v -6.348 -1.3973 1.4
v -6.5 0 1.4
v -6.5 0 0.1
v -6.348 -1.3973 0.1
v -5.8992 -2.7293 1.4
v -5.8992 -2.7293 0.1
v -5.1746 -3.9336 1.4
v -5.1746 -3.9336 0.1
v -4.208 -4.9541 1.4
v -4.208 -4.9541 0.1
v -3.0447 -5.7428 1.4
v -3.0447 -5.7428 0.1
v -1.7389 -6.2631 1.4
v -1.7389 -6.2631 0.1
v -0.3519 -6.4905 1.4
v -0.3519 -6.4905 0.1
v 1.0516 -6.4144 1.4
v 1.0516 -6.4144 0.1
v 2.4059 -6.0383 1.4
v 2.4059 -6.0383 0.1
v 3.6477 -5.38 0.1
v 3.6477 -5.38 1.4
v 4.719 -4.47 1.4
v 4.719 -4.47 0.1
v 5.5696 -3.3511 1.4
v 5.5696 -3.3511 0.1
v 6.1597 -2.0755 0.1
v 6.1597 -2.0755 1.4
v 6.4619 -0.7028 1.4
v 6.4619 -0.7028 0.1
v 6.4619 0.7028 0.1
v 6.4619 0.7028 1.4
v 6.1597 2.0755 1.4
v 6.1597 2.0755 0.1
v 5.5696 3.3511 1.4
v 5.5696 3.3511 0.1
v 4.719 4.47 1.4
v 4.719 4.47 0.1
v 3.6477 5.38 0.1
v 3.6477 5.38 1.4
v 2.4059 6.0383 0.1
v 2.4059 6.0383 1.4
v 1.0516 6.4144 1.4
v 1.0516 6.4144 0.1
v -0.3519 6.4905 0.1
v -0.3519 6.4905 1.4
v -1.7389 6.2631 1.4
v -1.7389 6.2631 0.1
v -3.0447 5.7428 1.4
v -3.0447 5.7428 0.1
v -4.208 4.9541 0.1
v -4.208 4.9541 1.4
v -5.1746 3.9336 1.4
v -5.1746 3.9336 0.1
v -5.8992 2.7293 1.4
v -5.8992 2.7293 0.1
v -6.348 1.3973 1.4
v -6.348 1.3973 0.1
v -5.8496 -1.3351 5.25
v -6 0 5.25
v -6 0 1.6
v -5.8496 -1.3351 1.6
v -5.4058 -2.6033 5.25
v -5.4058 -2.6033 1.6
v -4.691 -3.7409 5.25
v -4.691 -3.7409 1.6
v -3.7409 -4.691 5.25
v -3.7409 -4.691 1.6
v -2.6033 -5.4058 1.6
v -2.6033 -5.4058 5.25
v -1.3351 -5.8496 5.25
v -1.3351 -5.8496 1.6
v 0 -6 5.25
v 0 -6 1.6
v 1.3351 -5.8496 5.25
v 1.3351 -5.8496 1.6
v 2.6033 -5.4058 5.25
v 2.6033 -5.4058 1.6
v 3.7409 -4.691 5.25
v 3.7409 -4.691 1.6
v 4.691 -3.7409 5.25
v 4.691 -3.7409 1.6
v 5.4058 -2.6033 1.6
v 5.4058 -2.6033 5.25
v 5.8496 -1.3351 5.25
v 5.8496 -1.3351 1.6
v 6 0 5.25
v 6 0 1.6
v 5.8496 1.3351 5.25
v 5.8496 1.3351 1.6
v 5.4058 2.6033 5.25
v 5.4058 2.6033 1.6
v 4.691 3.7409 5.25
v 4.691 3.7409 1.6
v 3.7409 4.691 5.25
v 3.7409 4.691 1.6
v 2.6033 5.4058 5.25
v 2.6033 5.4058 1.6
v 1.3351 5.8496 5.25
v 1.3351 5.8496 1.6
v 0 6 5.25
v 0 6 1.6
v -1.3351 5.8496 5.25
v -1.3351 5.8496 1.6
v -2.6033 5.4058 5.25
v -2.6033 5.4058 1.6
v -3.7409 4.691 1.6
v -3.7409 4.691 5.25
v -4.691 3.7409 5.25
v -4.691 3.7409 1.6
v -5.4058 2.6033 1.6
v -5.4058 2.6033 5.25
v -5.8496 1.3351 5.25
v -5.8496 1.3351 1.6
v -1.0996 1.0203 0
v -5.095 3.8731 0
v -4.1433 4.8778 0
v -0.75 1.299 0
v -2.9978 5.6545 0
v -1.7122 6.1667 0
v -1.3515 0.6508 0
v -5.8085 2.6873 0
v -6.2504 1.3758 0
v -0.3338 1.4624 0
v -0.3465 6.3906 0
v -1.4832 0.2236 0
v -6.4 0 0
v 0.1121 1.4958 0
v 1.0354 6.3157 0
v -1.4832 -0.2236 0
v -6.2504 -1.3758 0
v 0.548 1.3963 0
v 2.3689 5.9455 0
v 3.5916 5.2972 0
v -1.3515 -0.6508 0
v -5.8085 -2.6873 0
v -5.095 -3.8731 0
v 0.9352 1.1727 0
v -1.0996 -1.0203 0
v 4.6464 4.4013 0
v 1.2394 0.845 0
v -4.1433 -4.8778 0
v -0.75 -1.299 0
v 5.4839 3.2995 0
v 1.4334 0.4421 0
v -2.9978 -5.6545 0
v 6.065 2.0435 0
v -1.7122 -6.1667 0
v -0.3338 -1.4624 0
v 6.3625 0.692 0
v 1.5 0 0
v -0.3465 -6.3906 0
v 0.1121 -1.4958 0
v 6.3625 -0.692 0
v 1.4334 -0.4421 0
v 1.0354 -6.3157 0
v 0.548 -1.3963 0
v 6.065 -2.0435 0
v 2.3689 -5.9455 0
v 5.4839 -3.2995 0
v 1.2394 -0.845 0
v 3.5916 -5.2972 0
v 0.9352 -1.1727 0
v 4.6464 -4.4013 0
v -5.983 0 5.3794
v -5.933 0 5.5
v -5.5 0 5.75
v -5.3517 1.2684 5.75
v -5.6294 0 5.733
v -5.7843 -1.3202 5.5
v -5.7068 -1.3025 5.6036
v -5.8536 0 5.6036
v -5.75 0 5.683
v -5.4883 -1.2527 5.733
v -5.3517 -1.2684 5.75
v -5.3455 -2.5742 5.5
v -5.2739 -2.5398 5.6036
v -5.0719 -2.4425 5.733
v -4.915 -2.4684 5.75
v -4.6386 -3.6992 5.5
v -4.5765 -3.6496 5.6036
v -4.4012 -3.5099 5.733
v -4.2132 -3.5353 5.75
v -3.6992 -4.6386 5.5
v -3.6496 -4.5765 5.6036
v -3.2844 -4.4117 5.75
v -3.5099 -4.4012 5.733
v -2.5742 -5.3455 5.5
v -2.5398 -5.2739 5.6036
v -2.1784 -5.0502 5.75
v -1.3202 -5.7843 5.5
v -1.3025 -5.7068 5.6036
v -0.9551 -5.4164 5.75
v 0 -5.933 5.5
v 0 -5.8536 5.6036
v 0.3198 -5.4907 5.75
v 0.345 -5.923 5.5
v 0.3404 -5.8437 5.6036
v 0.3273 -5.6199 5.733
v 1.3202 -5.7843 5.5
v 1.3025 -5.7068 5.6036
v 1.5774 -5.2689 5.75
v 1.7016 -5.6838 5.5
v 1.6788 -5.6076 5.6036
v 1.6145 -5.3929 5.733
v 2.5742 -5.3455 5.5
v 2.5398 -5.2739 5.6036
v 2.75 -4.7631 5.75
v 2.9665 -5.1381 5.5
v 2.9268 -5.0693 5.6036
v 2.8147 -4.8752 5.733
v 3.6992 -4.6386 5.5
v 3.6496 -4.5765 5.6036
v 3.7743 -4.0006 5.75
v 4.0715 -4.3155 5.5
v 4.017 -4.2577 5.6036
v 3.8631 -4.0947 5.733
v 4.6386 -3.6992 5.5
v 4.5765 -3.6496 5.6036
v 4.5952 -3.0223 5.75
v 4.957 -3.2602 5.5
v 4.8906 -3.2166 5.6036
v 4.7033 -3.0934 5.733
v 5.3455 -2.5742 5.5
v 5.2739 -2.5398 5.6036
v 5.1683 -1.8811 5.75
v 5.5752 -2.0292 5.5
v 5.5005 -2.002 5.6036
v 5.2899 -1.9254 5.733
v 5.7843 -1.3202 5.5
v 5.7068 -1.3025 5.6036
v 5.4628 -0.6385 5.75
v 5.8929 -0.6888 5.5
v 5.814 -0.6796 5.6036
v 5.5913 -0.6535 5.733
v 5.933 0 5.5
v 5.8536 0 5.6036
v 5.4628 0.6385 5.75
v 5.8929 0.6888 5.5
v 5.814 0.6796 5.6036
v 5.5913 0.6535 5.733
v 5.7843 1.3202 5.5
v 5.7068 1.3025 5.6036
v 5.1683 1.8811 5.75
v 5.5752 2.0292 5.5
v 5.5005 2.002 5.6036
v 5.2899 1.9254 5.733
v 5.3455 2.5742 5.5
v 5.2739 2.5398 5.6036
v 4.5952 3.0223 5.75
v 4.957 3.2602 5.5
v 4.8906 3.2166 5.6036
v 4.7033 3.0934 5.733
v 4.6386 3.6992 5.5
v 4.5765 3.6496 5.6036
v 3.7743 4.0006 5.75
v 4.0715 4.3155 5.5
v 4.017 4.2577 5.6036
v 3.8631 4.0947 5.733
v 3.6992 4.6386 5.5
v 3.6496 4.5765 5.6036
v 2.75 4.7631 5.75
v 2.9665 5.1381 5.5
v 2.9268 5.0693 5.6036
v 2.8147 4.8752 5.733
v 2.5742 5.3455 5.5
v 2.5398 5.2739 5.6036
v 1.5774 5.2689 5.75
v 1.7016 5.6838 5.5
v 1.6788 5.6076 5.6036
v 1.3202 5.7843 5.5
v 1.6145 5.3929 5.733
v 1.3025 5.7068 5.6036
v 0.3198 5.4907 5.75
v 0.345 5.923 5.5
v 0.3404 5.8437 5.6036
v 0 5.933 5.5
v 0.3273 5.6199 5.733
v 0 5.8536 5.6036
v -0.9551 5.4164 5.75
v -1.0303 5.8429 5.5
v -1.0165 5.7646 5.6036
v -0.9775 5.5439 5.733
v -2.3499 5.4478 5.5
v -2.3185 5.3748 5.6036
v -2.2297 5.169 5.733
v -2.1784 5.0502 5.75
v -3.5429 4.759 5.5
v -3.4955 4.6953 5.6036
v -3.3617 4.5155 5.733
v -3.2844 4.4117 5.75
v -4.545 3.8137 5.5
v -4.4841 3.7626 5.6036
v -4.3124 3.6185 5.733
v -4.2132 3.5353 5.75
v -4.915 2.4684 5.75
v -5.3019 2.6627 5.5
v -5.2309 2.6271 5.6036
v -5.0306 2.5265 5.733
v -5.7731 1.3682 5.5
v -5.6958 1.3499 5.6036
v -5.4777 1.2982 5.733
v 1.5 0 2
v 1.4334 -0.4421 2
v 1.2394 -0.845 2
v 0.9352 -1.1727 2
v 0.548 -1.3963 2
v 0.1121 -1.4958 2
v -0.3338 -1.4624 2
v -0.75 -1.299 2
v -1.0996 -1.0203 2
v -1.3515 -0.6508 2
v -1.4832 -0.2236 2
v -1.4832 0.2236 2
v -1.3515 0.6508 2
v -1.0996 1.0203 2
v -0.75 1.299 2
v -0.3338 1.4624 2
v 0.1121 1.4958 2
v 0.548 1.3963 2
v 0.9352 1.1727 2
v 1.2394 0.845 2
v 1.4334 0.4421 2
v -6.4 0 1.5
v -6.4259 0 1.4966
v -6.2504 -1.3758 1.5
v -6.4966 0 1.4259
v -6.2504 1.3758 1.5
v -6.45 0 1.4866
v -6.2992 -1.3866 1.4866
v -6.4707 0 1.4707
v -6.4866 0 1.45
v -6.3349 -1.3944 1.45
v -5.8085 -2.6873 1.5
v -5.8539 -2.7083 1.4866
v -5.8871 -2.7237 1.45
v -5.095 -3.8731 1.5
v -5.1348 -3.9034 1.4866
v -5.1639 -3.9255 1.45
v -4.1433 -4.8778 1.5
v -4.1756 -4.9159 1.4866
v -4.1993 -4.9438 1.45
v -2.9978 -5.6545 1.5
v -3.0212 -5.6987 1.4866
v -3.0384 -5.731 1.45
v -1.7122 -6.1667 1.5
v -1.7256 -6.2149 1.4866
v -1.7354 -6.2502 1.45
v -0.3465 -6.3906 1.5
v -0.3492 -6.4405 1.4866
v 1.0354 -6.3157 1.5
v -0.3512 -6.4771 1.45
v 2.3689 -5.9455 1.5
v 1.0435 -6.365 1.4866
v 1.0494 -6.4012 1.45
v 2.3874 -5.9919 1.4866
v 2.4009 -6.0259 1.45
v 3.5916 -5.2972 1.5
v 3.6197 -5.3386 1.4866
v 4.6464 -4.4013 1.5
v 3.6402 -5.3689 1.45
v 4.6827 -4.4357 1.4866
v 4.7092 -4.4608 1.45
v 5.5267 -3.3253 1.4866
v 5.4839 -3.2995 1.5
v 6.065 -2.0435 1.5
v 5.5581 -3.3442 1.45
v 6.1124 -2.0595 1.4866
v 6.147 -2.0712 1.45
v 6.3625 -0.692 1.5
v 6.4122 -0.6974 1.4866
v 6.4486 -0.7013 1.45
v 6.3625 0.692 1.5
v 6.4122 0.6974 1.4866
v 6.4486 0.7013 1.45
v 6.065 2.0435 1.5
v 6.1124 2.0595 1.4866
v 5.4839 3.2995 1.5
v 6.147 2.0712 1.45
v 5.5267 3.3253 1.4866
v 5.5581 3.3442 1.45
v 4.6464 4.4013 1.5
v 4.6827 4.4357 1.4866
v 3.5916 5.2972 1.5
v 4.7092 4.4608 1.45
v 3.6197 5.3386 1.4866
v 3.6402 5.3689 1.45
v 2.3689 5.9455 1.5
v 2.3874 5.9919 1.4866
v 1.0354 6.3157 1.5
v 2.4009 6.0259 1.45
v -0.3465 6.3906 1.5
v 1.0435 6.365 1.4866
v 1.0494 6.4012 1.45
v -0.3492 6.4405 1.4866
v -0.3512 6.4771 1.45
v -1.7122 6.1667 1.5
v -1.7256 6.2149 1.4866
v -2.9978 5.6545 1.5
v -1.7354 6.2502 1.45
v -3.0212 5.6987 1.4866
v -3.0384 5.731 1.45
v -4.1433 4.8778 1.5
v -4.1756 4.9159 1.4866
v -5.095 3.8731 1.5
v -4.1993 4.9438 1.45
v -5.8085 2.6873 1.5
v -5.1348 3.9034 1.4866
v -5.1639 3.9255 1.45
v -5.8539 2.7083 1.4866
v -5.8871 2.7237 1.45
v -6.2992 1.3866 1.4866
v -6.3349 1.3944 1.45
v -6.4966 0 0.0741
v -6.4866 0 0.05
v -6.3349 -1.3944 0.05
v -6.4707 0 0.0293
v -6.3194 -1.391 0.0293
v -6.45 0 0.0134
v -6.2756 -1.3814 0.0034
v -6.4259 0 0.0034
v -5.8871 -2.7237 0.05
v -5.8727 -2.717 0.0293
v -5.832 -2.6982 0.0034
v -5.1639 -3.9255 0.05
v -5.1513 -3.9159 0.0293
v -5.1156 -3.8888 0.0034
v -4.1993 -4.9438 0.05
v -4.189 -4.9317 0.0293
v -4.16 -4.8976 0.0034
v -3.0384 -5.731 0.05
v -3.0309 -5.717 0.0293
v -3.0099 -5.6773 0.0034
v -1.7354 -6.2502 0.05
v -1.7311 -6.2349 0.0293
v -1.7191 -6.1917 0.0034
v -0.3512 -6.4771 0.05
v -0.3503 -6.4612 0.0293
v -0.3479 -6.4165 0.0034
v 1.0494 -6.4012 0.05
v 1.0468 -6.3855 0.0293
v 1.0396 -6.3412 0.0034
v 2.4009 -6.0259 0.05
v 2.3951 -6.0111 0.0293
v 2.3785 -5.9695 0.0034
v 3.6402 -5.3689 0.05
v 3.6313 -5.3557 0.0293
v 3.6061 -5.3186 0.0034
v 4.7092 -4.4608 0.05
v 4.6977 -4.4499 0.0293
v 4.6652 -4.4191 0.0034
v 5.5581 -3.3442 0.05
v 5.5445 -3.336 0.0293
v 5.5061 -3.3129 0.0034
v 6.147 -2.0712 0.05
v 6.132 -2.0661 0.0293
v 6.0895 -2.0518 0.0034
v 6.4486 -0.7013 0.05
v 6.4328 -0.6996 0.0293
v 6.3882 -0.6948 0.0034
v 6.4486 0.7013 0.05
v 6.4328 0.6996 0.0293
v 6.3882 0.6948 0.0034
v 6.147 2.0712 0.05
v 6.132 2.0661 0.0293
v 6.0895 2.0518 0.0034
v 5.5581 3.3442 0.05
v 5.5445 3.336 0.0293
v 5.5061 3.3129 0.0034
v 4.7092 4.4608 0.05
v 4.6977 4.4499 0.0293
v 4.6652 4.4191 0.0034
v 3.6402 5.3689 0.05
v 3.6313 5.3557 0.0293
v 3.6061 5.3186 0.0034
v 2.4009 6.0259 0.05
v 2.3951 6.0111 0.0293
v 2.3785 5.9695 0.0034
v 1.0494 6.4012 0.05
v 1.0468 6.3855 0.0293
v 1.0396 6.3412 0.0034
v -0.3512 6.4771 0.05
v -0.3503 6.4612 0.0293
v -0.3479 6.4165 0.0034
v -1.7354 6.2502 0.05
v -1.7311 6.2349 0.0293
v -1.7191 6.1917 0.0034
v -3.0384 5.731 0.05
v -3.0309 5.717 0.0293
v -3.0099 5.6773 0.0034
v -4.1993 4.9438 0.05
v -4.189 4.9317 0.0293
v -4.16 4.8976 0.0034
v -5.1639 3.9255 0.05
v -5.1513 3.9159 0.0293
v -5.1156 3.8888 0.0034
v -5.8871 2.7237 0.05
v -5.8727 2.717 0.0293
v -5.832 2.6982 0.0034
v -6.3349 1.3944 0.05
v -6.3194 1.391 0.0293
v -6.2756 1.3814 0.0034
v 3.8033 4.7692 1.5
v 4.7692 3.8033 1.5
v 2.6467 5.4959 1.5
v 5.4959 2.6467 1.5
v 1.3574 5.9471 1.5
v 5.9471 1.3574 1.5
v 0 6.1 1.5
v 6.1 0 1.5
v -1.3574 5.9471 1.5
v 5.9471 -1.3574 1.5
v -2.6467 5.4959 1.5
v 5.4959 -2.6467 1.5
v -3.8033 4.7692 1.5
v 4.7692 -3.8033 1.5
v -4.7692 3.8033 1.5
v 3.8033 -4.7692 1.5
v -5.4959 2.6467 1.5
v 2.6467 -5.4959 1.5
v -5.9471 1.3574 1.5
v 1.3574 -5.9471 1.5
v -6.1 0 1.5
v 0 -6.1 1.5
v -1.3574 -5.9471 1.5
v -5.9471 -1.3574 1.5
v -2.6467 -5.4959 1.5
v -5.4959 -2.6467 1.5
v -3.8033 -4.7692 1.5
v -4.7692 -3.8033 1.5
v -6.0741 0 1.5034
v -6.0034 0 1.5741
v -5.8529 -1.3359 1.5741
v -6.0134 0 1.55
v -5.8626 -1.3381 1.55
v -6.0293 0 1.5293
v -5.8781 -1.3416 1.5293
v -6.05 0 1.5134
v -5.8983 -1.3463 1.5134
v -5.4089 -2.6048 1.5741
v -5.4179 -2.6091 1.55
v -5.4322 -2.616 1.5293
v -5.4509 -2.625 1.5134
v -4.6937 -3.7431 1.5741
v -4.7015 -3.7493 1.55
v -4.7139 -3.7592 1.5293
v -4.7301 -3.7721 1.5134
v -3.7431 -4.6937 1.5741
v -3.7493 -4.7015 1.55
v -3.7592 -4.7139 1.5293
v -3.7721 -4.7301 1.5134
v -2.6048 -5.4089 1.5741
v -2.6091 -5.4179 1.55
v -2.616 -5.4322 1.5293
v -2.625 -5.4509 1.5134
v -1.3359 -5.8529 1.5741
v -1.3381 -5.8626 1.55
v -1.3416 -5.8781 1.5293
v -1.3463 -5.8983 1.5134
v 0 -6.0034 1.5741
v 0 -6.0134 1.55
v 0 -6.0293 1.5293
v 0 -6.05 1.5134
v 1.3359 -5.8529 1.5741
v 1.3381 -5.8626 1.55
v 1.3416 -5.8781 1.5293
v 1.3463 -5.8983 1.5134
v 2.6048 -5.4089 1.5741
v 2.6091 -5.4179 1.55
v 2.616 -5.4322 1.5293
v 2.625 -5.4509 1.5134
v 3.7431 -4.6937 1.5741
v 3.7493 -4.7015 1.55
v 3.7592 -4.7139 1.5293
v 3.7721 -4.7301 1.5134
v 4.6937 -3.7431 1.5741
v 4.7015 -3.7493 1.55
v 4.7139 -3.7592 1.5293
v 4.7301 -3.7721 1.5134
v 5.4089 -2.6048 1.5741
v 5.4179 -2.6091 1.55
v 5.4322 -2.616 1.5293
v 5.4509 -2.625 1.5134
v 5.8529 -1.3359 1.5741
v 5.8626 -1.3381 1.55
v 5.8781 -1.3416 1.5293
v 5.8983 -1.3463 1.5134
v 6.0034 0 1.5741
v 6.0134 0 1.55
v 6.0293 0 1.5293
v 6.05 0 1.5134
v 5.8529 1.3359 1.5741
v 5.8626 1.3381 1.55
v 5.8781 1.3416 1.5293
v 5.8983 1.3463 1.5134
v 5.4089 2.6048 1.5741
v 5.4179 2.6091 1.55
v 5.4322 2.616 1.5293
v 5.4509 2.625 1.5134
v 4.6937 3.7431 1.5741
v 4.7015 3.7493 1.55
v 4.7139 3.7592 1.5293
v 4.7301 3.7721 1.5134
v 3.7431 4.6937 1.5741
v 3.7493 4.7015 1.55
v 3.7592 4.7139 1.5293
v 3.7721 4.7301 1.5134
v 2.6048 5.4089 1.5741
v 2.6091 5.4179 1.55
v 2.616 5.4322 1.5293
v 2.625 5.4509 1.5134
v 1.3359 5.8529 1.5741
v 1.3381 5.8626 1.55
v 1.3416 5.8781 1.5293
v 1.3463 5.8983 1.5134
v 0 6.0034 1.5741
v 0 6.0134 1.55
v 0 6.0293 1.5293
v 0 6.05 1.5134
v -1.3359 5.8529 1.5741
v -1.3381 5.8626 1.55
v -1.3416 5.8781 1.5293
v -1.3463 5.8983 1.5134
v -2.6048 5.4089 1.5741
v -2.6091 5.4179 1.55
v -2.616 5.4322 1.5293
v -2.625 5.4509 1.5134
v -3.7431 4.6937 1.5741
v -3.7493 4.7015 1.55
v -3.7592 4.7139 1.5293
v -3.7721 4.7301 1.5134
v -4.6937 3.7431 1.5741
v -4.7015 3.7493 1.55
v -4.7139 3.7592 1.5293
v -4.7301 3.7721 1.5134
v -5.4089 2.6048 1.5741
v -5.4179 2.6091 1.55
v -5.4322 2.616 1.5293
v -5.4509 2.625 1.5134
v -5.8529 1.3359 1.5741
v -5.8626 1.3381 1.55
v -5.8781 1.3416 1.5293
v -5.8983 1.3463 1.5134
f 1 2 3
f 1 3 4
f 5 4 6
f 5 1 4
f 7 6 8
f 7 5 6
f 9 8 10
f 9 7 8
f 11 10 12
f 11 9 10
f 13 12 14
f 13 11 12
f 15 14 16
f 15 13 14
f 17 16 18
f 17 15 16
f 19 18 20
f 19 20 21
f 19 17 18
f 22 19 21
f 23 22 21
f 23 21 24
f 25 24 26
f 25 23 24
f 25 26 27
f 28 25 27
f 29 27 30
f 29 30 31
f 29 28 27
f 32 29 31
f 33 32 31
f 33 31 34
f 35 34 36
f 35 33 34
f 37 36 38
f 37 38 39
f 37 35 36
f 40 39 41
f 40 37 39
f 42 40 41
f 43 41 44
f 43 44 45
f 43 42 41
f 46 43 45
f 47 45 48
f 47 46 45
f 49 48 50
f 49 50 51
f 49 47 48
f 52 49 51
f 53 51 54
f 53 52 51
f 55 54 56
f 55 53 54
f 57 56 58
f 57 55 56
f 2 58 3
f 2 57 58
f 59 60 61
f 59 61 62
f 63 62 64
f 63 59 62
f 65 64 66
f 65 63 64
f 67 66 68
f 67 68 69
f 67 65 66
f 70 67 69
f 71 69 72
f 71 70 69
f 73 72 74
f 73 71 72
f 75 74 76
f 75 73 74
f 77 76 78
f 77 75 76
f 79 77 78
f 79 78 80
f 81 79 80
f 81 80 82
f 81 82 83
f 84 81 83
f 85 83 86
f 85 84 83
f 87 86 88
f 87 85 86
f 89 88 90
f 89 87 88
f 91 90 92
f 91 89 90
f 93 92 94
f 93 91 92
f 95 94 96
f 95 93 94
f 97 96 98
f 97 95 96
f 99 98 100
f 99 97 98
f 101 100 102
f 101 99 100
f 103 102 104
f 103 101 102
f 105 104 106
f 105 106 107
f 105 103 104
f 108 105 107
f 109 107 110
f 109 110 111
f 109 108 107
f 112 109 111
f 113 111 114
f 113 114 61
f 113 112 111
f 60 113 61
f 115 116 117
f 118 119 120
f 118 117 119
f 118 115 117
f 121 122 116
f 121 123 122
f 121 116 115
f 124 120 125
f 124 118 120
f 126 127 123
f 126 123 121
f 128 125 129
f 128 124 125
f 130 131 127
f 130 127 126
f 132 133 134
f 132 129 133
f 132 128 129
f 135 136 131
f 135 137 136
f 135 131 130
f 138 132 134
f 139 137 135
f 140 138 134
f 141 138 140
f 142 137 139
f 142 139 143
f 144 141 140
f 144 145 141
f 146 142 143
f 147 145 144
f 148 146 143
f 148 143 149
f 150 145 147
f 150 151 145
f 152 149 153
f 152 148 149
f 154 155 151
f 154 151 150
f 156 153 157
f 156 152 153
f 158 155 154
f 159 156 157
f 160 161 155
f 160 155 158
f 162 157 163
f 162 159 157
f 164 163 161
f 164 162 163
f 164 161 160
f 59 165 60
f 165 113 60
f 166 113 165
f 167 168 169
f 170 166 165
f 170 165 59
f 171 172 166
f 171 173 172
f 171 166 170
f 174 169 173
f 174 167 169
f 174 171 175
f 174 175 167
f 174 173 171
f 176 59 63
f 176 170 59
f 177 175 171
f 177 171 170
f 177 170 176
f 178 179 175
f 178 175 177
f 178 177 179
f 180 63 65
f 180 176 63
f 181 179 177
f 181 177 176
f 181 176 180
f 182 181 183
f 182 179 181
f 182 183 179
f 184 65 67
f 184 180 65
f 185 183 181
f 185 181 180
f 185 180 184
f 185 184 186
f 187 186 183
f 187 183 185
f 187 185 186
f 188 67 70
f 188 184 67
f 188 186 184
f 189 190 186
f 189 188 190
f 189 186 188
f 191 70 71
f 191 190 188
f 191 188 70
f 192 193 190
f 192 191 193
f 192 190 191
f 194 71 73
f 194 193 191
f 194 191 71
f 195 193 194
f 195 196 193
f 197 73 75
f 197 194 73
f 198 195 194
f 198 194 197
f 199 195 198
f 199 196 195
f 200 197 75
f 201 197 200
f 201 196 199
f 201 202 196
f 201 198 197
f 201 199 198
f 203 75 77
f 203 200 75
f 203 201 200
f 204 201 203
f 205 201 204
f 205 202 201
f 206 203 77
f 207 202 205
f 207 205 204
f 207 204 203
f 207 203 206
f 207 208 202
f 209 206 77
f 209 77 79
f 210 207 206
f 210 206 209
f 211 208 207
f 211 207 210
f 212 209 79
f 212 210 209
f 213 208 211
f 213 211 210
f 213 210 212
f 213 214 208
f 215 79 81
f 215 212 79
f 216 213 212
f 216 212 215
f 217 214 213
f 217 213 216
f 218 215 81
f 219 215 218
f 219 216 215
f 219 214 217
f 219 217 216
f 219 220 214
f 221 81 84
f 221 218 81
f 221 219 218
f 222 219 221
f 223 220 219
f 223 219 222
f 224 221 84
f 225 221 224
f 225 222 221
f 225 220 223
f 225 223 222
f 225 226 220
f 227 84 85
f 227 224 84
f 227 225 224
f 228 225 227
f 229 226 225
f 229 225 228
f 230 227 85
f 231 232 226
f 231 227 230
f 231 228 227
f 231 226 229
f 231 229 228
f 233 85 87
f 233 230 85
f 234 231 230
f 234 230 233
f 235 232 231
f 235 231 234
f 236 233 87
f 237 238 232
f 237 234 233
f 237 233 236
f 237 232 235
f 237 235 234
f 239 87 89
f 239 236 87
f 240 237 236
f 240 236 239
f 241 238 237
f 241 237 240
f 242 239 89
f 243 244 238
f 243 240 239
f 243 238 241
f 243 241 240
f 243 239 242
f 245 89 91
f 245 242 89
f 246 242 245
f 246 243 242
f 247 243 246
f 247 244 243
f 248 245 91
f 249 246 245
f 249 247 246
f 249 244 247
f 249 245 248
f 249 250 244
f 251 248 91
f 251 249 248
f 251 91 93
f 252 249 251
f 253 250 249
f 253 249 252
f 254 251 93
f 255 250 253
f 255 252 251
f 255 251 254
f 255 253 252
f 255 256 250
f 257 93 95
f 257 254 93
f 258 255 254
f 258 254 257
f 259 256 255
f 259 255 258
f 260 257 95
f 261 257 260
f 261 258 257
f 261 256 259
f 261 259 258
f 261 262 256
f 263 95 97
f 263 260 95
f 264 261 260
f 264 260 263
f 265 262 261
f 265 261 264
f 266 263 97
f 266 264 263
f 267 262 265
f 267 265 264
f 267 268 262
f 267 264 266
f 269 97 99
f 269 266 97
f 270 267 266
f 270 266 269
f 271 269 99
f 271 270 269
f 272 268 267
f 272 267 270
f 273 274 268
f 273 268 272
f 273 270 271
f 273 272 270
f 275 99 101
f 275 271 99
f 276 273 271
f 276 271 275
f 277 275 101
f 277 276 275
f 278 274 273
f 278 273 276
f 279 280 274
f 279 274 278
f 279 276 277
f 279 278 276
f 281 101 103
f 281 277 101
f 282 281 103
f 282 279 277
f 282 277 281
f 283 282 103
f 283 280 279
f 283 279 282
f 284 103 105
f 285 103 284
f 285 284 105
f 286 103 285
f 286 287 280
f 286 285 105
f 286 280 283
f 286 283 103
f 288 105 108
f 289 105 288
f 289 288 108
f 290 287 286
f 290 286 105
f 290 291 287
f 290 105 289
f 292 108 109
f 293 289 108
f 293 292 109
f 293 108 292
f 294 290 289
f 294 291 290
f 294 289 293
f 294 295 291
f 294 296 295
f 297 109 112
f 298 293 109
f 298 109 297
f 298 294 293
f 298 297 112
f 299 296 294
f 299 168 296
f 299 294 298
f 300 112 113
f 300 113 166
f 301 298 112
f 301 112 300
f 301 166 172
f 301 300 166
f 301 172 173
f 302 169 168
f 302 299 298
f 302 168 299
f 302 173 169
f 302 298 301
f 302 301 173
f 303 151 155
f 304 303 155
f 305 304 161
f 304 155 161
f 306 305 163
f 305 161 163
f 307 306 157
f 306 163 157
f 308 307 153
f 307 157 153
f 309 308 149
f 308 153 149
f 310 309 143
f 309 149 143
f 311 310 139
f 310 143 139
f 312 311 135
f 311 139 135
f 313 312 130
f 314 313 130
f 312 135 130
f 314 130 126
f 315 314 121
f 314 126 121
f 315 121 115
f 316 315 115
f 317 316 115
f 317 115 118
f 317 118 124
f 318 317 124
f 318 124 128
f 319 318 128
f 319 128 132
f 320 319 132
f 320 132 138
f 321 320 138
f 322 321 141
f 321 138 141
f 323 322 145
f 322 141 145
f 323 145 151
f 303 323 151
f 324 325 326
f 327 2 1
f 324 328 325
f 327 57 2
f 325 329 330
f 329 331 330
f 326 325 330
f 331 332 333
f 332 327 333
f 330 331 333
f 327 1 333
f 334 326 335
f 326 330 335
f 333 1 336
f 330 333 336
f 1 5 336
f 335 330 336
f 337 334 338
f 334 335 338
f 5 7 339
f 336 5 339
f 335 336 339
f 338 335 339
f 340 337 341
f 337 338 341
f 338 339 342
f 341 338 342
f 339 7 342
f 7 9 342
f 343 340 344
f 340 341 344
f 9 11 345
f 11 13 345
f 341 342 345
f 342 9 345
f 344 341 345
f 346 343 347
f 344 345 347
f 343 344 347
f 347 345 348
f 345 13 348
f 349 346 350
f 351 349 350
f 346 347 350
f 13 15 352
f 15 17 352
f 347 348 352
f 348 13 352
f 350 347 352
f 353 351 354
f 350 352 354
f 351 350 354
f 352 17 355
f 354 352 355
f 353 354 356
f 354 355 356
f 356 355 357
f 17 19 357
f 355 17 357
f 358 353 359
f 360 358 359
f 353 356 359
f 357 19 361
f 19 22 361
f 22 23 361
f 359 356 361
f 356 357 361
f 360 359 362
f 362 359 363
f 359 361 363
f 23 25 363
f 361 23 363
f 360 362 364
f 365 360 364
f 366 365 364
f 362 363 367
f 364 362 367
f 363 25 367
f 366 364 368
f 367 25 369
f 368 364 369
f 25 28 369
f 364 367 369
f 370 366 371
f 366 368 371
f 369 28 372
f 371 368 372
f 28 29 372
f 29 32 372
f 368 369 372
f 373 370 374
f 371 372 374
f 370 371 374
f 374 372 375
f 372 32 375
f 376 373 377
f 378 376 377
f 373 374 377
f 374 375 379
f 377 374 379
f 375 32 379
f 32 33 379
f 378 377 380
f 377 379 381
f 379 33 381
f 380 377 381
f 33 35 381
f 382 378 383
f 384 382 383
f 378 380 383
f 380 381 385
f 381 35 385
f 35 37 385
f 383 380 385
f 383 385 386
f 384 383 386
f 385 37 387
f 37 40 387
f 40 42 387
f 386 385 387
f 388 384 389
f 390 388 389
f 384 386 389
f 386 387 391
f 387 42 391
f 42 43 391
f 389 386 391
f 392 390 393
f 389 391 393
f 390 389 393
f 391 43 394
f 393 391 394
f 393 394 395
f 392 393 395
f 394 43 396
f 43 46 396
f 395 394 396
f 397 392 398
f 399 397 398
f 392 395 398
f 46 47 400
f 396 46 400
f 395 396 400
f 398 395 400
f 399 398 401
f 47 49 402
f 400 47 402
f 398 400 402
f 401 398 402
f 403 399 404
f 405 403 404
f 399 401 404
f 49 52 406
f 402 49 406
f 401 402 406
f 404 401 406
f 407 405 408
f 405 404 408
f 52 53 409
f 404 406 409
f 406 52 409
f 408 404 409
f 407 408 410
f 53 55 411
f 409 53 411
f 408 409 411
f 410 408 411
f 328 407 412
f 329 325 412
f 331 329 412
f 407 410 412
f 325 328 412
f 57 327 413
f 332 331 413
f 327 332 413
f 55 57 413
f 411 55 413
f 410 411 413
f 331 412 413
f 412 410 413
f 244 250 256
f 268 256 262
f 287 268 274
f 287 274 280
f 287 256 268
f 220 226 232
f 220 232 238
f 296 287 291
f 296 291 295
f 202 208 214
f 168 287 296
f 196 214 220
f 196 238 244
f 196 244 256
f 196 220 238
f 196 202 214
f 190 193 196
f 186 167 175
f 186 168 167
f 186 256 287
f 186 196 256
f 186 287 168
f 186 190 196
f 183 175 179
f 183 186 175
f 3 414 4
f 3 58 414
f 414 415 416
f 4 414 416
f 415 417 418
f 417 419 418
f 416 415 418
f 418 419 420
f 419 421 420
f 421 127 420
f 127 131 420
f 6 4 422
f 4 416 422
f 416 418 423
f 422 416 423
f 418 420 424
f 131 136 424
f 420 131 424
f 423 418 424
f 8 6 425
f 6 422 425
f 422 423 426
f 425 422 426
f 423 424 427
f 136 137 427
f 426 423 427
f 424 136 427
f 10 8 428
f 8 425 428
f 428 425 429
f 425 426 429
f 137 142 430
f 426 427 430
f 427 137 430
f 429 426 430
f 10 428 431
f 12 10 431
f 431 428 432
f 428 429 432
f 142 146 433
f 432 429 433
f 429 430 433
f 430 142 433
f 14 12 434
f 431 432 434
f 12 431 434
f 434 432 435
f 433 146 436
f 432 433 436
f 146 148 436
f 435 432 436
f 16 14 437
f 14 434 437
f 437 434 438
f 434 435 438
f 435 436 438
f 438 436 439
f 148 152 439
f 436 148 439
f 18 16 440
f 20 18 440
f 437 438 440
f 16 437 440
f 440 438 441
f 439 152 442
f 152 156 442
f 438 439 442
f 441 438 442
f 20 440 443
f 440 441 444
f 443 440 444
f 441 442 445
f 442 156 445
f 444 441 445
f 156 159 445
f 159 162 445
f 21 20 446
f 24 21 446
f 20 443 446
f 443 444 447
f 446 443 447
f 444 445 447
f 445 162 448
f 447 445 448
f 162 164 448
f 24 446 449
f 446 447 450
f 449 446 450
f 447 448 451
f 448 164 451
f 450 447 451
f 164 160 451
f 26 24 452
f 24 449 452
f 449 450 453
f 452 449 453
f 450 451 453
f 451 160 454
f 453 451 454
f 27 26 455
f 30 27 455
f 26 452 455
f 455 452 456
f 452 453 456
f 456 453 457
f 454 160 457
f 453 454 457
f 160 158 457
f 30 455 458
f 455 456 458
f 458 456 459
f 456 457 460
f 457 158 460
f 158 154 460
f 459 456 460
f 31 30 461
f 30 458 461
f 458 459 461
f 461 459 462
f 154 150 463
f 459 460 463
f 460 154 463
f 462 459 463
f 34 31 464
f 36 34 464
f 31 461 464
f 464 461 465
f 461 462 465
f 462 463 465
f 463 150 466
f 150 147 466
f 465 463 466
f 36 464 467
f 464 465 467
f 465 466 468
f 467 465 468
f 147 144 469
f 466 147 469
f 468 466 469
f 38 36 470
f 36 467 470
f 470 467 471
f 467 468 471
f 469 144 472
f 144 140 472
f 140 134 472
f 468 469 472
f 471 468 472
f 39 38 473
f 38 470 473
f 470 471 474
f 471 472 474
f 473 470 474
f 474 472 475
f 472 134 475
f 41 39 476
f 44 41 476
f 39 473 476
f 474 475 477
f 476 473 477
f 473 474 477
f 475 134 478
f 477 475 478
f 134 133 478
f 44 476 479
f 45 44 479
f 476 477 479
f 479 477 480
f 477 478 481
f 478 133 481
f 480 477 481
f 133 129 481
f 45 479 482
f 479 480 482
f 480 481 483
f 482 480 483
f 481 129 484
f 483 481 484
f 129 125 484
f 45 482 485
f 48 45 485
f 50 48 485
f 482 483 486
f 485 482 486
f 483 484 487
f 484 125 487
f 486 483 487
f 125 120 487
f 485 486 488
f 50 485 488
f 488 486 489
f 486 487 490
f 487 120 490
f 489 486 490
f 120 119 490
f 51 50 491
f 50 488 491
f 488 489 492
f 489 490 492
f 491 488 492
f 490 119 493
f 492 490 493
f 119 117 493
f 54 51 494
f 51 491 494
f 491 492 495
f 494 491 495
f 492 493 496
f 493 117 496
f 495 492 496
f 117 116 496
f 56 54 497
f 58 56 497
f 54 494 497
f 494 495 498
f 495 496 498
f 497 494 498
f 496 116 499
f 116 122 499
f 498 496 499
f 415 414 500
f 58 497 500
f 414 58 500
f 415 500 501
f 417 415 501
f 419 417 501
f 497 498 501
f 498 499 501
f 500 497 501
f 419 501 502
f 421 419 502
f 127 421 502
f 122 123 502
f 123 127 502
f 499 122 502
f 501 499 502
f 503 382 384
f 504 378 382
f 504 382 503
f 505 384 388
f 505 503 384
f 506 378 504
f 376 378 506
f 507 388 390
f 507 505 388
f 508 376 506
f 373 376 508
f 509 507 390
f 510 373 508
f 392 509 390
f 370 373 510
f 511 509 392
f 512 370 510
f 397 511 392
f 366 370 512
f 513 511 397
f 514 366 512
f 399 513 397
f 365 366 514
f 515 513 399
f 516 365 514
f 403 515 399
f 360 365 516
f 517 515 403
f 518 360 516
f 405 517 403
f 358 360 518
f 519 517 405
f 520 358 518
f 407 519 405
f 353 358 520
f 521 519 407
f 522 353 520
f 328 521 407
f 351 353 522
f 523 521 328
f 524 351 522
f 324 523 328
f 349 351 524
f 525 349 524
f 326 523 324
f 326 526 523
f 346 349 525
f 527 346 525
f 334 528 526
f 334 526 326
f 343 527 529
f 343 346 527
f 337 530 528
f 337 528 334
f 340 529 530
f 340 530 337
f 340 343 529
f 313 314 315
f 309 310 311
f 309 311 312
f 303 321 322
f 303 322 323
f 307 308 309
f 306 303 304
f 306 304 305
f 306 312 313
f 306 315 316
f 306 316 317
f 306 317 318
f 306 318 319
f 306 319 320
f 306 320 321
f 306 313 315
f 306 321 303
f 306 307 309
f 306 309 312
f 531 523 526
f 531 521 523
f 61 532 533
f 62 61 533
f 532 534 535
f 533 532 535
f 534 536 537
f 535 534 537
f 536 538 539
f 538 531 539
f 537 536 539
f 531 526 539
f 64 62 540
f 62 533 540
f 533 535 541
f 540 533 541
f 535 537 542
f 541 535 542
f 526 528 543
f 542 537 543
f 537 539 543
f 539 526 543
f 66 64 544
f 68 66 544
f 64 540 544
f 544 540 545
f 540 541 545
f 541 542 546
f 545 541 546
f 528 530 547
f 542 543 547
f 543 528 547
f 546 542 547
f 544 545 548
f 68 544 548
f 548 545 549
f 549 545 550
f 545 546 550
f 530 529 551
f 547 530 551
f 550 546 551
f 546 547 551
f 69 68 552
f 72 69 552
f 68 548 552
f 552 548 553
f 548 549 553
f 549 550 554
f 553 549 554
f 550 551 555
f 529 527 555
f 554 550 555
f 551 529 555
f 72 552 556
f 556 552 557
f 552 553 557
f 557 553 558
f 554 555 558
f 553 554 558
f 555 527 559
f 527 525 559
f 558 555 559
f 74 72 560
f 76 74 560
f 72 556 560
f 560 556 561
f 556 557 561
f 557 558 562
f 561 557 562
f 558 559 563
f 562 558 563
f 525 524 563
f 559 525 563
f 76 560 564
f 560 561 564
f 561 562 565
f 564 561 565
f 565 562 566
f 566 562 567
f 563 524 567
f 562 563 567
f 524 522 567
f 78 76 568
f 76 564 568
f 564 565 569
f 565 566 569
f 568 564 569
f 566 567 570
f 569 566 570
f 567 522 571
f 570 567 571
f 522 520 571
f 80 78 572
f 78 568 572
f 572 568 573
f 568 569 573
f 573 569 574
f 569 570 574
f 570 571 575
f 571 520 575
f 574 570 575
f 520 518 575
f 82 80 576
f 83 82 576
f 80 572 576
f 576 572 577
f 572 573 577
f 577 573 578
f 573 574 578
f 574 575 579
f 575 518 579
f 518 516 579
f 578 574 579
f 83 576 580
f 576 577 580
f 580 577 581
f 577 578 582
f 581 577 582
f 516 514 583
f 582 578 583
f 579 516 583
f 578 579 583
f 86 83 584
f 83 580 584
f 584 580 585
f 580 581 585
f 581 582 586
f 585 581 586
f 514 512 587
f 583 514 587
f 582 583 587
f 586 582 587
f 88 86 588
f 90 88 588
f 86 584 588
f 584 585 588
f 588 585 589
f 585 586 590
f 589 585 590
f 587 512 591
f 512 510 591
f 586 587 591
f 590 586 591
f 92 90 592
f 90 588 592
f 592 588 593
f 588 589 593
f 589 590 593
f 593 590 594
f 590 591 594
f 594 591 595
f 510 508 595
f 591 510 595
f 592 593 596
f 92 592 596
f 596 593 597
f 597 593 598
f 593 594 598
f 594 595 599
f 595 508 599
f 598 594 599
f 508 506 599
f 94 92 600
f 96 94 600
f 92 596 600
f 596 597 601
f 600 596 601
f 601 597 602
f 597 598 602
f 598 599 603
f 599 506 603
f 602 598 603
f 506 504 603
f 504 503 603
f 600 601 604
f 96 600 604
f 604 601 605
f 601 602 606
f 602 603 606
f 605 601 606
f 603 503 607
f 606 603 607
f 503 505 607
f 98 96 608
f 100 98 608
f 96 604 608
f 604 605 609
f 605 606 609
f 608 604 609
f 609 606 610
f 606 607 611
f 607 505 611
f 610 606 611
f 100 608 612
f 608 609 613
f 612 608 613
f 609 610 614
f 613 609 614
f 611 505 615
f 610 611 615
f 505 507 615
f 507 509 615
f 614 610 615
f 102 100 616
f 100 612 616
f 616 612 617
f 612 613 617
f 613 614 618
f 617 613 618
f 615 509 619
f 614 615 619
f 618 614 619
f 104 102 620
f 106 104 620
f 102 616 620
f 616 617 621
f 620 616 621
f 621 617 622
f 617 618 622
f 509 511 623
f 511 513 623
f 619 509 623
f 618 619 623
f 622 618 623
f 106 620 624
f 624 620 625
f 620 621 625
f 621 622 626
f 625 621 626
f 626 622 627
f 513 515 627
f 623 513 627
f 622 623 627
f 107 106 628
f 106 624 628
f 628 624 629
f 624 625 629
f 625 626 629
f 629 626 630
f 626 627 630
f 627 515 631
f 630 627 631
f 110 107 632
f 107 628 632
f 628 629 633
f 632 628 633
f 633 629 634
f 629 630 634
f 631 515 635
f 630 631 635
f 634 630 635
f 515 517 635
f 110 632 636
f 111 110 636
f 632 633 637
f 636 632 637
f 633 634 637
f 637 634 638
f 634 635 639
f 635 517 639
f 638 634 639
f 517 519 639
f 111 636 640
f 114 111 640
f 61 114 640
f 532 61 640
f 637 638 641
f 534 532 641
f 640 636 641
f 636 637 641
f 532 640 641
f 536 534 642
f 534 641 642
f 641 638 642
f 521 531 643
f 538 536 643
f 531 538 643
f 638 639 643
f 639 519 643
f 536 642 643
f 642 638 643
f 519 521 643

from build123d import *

# Parameters (mm, degrees)
FILLET_R     = 0.5
FILLET001_R  = 0.1
SKETCH001_R  = 1.5
POCKET_DEPTH = 2


with BuildPart() as part:
    # Sketch → Revolution (revolve)
    with BuildSketch(Plane.XZ):
        Polygon((-6.5, 0), (-6.5, 1.5), (-6, 1.5), (-6, 5.75), (0, 5.75), (0, 0), align=None)
    revolve(axis=Axis((0, 0, 0), (0, 0, 1)))

    # Fillet
    fillet_edges = [part.edges().sort_by_distance(p)[0] for p in [
        (6, 0, 5.75),
    ]]
    fillet(fillet_edges, radius=FILLET_R)

    # Fillet001
    fillet001_edges = [part.edges().sort_by_distance(p)[0] for p in [
        (6.5, 0, 1.5),
        (6, 0, 1.5),
        (6.5, 0, 0),
    ]]
    fillet(fillet001_edges, radius=FILLET001_R)

    # Sketch001 (on Face9 of Fillet001) → Pocket (cut)
    with BuildSketch(Plane(origin=(0, 0, 0), x_dir=(1, 0, 0), z_dir=(0, 0, -1))):
        Circle(SKETCH001_R)
    extrude(amount=-POCKET_DEPTH, mode=Mode.SUBTRACT)


solid = part.part
